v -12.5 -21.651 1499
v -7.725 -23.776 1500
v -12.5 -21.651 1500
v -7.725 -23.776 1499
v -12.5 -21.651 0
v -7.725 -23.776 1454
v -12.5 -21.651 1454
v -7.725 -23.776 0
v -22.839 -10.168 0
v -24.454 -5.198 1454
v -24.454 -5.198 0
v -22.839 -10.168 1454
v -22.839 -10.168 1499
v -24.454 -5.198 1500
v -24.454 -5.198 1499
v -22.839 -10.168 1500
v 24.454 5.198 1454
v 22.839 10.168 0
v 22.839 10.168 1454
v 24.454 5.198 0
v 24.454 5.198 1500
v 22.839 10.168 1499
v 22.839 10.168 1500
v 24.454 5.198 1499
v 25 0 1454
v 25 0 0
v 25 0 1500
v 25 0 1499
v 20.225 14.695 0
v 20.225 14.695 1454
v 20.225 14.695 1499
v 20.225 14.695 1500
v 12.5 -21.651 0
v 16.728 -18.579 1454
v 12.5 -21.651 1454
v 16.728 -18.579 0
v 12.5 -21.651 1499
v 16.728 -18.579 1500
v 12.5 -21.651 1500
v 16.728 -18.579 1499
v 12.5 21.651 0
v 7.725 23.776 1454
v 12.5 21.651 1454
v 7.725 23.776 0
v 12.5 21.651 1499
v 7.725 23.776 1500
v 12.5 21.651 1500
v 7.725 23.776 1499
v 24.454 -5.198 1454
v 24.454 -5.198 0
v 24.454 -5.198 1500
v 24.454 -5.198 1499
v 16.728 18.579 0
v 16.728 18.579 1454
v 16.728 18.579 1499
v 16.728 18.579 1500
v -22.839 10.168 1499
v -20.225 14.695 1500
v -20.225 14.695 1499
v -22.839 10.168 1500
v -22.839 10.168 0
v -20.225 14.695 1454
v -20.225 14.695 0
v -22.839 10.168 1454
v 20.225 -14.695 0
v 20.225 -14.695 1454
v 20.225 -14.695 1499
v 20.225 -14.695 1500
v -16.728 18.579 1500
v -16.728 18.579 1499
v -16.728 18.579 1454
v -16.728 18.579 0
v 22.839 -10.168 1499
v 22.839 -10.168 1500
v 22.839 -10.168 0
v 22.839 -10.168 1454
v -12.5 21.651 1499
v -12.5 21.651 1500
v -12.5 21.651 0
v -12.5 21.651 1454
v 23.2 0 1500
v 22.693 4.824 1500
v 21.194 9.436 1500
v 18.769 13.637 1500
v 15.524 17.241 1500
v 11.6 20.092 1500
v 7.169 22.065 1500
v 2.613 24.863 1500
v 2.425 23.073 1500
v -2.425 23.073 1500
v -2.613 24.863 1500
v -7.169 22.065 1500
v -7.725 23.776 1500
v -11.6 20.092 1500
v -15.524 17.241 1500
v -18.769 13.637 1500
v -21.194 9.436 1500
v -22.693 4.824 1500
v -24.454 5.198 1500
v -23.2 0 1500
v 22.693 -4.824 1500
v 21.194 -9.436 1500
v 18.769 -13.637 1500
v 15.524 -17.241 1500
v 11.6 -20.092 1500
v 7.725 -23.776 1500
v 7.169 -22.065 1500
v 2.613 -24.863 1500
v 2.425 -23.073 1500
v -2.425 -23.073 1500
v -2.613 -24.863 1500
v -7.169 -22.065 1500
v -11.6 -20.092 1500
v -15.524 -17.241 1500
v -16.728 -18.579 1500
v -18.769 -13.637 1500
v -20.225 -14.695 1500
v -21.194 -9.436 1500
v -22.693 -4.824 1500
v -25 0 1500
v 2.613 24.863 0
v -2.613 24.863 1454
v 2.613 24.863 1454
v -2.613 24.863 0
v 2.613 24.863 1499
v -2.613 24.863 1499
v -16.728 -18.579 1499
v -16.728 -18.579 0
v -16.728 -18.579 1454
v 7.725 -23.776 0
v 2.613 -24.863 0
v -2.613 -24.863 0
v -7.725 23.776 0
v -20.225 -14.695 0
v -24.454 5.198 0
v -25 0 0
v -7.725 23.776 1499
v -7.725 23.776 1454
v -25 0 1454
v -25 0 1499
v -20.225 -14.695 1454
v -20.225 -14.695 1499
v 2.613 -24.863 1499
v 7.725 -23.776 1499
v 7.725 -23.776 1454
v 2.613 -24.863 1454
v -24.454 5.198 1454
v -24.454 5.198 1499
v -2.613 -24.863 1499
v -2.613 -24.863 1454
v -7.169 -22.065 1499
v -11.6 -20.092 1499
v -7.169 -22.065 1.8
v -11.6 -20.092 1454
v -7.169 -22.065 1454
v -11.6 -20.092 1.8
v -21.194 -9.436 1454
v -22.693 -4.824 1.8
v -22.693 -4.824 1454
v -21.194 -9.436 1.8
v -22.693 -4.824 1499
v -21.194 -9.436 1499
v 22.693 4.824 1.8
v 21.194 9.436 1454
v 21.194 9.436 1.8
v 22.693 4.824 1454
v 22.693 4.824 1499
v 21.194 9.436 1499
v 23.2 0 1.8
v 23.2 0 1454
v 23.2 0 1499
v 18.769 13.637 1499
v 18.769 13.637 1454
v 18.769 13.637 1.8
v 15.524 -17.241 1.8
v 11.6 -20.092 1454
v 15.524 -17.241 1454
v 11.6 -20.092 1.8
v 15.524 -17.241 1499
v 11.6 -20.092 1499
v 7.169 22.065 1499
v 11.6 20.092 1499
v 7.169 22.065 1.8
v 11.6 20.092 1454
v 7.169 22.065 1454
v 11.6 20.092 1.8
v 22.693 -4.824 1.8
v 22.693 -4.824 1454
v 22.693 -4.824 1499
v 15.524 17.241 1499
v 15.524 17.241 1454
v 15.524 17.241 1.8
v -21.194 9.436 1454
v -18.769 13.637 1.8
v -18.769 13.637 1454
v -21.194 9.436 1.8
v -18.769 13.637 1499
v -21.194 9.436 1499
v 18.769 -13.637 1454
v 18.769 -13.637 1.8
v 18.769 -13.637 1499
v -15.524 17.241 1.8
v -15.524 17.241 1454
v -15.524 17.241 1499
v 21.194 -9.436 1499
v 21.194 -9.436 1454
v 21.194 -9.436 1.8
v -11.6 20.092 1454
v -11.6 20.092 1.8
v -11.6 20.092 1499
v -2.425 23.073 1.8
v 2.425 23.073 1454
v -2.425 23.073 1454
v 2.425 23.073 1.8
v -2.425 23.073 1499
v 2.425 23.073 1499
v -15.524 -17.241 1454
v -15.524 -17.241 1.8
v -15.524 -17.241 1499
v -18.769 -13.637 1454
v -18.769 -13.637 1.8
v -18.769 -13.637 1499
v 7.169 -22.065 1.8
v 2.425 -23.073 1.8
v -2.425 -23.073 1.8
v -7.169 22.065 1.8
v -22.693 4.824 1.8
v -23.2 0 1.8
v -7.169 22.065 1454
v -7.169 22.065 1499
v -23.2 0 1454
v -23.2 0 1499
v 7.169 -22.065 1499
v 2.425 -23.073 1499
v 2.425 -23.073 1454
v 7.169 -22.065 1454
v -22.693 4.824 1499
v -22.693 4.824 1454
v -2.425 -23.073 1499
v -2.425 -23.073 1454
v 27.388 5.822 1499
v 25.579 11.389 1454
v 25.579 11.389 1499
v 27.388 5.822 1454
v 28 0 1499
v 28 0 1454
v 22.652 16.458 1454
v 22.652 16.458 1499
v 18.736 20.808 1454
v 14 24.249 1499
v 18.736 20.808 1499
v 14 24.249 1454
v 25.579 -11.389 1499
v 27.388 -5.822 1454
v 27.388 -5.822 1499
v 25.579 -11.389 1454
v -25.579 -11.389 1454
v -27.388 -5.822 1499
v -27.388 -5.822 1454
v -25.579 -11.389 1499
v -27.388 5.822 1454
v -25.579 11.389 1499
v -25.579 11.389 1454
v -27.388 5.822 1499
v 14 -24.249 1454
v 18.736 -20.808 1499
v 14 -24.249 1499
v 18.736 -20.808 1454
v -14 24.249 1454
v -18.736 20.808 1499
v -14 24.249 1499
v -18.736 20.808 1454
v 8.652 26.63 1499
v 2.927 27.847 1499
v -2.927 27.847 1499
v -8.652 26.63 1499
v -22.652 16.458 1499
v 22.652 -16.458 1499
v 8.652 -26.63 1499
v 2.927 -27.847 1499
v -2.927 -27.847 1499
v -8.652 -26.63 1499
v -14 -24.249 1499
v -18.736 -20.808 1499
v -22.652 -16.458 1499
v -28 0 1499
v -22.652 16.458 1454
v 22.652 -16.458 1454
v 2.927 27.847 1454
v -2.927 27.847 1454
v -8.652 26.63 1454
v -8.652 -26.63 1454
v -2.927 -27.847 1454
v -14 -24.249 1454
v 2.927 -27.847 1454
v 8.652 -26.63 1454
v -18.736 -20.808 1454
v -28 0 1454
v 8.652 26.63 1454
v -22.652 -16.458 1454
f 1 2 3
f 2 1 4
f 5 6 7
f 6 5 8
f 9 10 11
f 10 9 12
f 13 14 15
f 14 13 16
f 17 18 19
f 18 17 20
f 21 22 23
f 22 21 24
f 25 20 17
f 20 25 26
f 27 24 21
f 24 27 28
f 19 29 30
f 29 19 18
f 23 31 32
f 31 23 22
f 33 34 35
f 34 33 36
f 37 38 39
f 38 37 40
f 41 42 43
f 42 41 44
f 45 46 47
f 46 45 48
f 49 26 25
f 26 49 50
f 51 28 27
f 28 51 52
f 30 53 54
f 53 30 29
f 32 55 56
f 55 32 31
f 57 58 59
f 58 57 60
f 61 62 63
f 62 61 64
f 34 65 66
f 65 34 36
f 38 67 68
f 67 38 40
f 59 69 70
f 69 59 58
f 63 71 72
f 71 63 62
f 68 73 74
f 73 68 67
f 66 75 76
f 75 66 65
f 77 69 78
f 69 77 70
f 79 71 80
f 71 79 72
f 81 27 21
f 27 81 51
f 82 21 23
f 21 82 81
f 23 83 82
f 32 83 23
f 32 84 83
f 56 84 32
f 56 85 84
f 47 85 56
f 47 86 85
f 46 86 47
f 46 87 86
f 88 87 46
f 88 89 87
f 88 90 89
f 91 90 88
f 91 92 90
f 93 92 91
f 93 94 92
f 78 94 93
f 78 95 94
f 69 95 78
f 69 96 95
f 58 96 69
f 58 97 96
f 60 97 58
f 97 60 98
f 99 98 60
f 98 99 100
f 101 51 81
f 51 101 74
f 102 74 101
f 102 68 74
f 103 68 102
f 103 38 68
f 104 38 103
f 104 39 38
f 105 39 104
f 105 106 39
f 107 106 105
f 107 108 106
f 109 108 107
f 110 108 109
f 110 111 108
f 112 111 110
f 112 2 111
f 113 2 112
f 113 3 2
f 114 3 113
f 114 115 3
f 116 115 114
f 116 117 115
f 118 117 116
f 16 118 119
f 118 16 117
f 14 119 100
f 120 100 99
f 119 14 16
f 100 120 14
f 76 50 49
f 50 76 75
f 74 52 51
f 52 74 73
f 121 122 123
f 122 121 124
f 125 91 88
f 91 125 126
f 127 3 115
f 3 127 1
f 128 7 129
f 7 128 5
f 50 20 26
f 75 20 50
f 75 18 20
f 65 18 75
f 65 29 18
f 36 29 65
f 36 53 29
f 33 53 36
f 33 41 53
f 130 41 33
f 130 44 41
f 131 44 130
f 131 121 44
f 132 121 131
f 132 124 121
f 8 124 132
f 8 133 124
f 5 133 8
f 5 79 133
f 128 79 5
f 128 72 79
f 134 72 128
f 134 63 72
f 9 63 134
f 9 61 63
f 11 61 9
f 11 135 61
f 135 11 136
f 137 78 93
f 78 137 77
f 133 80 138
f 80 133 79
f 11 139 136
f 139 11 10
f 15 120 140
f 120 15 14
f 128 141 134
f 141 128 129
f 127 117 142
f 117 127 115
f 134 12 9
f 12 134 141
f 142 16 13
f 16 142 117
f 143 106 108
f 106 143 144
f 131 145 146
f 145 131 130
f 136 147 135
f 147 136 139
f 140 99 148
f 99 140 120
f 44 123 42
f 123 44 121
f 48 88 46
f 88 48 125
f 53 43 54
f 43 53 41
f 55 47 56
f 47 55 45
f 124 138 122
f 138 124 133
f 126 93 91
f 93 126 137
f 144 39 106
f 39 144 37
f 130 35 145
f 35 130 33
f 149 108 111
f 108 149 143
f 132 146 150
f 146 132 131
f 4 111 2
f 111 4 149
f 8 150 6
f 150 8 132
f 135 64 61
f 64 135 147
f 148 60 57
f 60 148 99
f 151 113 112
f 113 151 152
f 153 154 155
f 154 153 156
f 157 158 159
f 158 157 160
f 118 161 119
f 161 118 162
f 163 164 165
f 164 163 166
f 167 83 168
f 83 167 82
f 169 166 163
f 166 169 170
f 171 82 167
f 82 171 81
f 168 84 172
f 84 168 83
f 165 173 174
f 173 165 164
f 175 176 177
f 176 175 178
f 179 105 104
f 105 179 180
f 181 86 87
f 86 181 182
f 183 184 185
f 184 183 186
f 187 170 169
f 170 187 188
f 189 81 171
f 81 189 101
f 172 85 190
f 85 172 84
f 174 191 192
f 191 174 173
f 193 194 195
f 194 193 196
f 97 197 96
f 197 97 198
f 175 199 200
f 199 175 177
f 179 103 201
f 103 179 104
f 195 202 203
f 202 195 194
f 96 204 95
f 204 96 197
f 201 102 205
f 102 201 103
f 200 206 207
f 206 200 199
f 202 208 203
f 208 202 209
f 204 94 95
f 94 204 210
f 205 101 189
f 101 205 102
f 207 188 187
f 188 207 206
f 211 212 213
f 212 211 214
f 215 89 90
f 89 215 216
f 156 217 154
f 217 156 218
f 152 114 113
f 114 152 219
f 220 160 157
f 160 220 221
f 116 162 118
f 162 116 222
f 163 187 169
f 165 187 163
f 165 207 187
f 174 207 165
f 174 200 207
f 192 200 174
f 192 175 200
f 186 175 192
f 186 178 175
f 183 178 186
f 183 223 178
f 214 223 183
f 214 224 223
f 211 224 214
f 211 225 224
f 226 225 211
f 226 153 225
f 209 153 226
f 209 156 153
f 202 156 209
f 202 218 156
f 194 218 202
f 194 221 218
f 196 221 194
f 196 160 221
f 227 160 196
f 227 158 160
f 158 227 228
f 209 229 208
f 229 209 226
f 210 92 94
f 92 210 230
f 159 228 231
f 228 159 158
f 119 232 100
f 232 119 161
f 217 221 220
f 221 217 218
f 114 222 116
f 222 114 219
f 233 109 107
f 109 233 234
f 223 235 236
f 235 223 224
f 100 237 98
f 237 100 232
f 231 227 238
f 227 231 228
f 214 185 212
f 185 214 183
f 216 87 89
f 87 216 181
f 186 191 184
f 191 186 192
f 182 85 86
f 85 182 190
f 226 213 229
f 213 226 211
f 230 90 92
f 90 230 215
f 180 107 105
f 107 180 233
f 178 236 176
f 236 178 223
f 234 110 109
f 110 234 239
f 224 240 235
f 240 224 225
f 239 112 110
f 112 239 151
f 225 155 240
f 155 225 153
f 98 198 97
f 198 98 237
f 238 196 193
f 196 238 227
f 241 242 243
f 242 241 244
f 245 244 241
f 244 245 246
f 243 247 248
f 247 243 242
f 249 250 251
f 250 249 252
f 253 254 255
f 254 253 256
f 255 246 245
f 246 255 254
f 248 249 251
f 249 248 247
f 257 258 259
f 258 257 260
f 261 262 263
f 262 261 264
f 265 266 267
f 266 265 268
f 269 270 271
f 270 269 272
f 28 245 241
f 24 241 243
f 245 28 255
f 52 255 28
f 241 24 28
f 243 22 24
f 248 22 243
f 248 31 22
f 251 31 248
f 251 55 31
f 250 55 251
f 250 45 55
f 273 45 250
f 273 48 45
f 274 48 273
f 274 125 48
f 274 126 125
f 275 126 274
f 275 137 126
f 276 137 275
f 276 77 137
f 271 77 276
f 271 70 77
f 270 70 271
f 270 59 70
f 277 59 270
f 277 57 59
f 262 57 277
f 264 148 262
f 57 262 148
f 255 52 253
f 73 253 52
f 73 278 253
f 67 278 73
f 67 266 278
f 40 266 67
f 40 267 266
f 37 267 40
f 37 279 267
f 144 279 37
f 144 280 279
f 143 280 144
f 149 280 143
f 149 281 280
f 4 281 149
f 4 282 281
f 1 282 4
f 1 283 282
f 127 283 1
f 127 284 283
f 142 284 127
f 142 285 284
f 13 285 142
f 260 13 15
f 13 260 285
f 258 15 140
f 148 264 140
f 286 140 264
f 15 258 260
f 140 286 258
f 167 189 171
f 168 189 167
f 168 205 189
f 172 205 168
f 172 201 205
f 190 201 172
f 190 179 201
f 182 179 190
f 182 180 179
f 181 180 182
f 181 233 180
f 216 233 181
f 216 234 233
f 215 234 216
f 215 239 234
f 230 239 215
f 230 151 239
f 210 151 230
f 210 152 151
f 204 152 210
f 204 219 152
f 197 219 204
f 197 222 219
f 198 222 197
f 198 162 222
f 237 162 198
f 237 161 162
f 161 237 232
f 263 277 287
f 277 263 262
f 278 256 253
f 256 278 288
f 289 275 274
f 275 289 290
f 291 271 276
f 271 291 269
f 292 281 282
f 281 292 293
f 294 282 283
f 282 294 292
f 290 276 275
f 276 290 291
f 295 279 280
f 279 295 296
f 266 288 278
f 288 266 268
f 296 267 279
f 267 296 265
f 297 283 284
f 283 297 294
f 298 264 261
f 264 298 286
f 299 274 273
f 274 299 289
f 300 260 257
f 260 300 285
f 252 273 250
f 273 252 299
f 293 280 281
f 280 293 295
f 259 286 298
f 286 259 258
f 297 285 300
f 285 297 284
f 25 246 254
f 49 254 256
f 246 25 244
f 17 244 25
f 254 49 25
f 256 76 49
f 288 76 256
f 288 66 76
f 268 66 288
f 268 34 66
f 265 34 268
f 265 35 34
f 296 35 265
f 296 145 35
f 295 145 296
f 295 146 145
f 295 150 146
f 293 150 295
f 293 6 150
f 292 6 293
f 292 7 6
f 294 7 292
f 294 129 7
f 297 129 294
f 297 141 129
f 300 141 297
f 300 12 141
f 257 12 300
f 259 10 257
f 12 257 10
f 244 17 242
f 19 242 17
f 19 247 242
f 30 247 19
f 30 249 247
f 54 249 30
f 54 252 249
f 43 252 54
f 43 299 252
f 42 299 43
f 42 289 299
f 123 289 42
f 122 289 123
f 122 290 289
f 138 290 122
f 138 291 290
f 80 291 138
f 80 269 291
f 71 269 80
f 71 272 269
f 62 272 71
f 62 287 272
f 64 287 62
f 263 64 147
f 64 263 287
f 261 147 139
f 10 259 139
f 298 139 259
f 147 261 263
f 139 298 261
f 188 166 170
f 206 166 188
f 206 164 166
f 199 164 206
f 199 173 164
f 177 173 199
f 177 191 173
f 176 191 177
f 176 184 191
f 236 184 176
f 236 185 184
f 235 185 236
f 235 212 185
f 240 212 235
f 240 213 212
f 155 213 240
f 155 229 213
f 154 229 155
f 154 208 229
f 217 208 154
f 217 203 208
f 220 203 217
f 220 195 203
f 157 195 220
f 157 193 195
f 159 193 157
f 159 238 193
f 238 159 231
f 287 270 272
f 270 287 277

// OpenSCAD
// Parameters
length_mm = 1500; //[750:3000:10]
ht50_outer_diameter = 50; //[45:60:0.5]
ht50_wall_thickness = 1.8; //[1.2:3.6:0.1]
socket_outer_diameter = 56; //[52:70:0.5]
socket_length = 45; //[25:90:1]
socket_wall_extra = 1.2; //[0.5:3:0.1]
stop_ring_length = 6; //[3:15:0.5]
stop_ring_radial = 1.0; //[0.5:3.0:0.1]
chamfer_length = 3; //[1:10:0.5]
overlap_mm = 1; //[0.5:2:0.1]

// HT Pipe - complete geometry
module ht_pipe() {
  color([0.85, 0.85, 0.8]) {
    // Outer pipe segment
    difference() {
      cylinder(h=length_mm, r=ht50_outer_diameter/2, center=false);
      translate([0, 0, ht50_wall_thickness])
        cylinder(h=length_mm - ht50_wall_thickness, r=ht50_outer_diameter/2 - ht50_wall_thickness, center=false);
    }
    
    // End fitting geometry
    union() {
      // Socket outer
      translate([0, 0, length_mm - socket_length - overlap_mm])
        cylinder(h=socket_length, r=socket_outer_diameter/2, center=false);
      
      // Socket bore main
      difference() {
        translate([0, 0, length_mm - socket_length - overlap_mm])
          cylinder(h=socket_length - stop_ring_length, r=ht50_outer_diameter/2 - ht50_wall_thickness - socket_wall_extra, center=false);
        
        // Stop ring
        translate([0, 0, length_mm - stop_ring_length - overlap_mm])
          cylinder(h=stop_ring_length, r=ht50_outer_diameter/2 - ht50_wall_thickness - socket_wall_extra - stop_ring_radial, center=false);
        
        // Chamfer
        translate([0, 0, length_mm - socket_length - overlap_mm])
          cylinder(h=chamfer_length, r1=ht50_outer_diameter/2 - ht50_wall_thickness - socket_wall_extra, r2=ht50_outer_diameter/2 - ht50_wall_thickness - socket_wall_extra + chamfer_length, center=false);
      }
    }
  }
}

// Assembly
module assembly() {
  ht_pipe();
}

assembly();
